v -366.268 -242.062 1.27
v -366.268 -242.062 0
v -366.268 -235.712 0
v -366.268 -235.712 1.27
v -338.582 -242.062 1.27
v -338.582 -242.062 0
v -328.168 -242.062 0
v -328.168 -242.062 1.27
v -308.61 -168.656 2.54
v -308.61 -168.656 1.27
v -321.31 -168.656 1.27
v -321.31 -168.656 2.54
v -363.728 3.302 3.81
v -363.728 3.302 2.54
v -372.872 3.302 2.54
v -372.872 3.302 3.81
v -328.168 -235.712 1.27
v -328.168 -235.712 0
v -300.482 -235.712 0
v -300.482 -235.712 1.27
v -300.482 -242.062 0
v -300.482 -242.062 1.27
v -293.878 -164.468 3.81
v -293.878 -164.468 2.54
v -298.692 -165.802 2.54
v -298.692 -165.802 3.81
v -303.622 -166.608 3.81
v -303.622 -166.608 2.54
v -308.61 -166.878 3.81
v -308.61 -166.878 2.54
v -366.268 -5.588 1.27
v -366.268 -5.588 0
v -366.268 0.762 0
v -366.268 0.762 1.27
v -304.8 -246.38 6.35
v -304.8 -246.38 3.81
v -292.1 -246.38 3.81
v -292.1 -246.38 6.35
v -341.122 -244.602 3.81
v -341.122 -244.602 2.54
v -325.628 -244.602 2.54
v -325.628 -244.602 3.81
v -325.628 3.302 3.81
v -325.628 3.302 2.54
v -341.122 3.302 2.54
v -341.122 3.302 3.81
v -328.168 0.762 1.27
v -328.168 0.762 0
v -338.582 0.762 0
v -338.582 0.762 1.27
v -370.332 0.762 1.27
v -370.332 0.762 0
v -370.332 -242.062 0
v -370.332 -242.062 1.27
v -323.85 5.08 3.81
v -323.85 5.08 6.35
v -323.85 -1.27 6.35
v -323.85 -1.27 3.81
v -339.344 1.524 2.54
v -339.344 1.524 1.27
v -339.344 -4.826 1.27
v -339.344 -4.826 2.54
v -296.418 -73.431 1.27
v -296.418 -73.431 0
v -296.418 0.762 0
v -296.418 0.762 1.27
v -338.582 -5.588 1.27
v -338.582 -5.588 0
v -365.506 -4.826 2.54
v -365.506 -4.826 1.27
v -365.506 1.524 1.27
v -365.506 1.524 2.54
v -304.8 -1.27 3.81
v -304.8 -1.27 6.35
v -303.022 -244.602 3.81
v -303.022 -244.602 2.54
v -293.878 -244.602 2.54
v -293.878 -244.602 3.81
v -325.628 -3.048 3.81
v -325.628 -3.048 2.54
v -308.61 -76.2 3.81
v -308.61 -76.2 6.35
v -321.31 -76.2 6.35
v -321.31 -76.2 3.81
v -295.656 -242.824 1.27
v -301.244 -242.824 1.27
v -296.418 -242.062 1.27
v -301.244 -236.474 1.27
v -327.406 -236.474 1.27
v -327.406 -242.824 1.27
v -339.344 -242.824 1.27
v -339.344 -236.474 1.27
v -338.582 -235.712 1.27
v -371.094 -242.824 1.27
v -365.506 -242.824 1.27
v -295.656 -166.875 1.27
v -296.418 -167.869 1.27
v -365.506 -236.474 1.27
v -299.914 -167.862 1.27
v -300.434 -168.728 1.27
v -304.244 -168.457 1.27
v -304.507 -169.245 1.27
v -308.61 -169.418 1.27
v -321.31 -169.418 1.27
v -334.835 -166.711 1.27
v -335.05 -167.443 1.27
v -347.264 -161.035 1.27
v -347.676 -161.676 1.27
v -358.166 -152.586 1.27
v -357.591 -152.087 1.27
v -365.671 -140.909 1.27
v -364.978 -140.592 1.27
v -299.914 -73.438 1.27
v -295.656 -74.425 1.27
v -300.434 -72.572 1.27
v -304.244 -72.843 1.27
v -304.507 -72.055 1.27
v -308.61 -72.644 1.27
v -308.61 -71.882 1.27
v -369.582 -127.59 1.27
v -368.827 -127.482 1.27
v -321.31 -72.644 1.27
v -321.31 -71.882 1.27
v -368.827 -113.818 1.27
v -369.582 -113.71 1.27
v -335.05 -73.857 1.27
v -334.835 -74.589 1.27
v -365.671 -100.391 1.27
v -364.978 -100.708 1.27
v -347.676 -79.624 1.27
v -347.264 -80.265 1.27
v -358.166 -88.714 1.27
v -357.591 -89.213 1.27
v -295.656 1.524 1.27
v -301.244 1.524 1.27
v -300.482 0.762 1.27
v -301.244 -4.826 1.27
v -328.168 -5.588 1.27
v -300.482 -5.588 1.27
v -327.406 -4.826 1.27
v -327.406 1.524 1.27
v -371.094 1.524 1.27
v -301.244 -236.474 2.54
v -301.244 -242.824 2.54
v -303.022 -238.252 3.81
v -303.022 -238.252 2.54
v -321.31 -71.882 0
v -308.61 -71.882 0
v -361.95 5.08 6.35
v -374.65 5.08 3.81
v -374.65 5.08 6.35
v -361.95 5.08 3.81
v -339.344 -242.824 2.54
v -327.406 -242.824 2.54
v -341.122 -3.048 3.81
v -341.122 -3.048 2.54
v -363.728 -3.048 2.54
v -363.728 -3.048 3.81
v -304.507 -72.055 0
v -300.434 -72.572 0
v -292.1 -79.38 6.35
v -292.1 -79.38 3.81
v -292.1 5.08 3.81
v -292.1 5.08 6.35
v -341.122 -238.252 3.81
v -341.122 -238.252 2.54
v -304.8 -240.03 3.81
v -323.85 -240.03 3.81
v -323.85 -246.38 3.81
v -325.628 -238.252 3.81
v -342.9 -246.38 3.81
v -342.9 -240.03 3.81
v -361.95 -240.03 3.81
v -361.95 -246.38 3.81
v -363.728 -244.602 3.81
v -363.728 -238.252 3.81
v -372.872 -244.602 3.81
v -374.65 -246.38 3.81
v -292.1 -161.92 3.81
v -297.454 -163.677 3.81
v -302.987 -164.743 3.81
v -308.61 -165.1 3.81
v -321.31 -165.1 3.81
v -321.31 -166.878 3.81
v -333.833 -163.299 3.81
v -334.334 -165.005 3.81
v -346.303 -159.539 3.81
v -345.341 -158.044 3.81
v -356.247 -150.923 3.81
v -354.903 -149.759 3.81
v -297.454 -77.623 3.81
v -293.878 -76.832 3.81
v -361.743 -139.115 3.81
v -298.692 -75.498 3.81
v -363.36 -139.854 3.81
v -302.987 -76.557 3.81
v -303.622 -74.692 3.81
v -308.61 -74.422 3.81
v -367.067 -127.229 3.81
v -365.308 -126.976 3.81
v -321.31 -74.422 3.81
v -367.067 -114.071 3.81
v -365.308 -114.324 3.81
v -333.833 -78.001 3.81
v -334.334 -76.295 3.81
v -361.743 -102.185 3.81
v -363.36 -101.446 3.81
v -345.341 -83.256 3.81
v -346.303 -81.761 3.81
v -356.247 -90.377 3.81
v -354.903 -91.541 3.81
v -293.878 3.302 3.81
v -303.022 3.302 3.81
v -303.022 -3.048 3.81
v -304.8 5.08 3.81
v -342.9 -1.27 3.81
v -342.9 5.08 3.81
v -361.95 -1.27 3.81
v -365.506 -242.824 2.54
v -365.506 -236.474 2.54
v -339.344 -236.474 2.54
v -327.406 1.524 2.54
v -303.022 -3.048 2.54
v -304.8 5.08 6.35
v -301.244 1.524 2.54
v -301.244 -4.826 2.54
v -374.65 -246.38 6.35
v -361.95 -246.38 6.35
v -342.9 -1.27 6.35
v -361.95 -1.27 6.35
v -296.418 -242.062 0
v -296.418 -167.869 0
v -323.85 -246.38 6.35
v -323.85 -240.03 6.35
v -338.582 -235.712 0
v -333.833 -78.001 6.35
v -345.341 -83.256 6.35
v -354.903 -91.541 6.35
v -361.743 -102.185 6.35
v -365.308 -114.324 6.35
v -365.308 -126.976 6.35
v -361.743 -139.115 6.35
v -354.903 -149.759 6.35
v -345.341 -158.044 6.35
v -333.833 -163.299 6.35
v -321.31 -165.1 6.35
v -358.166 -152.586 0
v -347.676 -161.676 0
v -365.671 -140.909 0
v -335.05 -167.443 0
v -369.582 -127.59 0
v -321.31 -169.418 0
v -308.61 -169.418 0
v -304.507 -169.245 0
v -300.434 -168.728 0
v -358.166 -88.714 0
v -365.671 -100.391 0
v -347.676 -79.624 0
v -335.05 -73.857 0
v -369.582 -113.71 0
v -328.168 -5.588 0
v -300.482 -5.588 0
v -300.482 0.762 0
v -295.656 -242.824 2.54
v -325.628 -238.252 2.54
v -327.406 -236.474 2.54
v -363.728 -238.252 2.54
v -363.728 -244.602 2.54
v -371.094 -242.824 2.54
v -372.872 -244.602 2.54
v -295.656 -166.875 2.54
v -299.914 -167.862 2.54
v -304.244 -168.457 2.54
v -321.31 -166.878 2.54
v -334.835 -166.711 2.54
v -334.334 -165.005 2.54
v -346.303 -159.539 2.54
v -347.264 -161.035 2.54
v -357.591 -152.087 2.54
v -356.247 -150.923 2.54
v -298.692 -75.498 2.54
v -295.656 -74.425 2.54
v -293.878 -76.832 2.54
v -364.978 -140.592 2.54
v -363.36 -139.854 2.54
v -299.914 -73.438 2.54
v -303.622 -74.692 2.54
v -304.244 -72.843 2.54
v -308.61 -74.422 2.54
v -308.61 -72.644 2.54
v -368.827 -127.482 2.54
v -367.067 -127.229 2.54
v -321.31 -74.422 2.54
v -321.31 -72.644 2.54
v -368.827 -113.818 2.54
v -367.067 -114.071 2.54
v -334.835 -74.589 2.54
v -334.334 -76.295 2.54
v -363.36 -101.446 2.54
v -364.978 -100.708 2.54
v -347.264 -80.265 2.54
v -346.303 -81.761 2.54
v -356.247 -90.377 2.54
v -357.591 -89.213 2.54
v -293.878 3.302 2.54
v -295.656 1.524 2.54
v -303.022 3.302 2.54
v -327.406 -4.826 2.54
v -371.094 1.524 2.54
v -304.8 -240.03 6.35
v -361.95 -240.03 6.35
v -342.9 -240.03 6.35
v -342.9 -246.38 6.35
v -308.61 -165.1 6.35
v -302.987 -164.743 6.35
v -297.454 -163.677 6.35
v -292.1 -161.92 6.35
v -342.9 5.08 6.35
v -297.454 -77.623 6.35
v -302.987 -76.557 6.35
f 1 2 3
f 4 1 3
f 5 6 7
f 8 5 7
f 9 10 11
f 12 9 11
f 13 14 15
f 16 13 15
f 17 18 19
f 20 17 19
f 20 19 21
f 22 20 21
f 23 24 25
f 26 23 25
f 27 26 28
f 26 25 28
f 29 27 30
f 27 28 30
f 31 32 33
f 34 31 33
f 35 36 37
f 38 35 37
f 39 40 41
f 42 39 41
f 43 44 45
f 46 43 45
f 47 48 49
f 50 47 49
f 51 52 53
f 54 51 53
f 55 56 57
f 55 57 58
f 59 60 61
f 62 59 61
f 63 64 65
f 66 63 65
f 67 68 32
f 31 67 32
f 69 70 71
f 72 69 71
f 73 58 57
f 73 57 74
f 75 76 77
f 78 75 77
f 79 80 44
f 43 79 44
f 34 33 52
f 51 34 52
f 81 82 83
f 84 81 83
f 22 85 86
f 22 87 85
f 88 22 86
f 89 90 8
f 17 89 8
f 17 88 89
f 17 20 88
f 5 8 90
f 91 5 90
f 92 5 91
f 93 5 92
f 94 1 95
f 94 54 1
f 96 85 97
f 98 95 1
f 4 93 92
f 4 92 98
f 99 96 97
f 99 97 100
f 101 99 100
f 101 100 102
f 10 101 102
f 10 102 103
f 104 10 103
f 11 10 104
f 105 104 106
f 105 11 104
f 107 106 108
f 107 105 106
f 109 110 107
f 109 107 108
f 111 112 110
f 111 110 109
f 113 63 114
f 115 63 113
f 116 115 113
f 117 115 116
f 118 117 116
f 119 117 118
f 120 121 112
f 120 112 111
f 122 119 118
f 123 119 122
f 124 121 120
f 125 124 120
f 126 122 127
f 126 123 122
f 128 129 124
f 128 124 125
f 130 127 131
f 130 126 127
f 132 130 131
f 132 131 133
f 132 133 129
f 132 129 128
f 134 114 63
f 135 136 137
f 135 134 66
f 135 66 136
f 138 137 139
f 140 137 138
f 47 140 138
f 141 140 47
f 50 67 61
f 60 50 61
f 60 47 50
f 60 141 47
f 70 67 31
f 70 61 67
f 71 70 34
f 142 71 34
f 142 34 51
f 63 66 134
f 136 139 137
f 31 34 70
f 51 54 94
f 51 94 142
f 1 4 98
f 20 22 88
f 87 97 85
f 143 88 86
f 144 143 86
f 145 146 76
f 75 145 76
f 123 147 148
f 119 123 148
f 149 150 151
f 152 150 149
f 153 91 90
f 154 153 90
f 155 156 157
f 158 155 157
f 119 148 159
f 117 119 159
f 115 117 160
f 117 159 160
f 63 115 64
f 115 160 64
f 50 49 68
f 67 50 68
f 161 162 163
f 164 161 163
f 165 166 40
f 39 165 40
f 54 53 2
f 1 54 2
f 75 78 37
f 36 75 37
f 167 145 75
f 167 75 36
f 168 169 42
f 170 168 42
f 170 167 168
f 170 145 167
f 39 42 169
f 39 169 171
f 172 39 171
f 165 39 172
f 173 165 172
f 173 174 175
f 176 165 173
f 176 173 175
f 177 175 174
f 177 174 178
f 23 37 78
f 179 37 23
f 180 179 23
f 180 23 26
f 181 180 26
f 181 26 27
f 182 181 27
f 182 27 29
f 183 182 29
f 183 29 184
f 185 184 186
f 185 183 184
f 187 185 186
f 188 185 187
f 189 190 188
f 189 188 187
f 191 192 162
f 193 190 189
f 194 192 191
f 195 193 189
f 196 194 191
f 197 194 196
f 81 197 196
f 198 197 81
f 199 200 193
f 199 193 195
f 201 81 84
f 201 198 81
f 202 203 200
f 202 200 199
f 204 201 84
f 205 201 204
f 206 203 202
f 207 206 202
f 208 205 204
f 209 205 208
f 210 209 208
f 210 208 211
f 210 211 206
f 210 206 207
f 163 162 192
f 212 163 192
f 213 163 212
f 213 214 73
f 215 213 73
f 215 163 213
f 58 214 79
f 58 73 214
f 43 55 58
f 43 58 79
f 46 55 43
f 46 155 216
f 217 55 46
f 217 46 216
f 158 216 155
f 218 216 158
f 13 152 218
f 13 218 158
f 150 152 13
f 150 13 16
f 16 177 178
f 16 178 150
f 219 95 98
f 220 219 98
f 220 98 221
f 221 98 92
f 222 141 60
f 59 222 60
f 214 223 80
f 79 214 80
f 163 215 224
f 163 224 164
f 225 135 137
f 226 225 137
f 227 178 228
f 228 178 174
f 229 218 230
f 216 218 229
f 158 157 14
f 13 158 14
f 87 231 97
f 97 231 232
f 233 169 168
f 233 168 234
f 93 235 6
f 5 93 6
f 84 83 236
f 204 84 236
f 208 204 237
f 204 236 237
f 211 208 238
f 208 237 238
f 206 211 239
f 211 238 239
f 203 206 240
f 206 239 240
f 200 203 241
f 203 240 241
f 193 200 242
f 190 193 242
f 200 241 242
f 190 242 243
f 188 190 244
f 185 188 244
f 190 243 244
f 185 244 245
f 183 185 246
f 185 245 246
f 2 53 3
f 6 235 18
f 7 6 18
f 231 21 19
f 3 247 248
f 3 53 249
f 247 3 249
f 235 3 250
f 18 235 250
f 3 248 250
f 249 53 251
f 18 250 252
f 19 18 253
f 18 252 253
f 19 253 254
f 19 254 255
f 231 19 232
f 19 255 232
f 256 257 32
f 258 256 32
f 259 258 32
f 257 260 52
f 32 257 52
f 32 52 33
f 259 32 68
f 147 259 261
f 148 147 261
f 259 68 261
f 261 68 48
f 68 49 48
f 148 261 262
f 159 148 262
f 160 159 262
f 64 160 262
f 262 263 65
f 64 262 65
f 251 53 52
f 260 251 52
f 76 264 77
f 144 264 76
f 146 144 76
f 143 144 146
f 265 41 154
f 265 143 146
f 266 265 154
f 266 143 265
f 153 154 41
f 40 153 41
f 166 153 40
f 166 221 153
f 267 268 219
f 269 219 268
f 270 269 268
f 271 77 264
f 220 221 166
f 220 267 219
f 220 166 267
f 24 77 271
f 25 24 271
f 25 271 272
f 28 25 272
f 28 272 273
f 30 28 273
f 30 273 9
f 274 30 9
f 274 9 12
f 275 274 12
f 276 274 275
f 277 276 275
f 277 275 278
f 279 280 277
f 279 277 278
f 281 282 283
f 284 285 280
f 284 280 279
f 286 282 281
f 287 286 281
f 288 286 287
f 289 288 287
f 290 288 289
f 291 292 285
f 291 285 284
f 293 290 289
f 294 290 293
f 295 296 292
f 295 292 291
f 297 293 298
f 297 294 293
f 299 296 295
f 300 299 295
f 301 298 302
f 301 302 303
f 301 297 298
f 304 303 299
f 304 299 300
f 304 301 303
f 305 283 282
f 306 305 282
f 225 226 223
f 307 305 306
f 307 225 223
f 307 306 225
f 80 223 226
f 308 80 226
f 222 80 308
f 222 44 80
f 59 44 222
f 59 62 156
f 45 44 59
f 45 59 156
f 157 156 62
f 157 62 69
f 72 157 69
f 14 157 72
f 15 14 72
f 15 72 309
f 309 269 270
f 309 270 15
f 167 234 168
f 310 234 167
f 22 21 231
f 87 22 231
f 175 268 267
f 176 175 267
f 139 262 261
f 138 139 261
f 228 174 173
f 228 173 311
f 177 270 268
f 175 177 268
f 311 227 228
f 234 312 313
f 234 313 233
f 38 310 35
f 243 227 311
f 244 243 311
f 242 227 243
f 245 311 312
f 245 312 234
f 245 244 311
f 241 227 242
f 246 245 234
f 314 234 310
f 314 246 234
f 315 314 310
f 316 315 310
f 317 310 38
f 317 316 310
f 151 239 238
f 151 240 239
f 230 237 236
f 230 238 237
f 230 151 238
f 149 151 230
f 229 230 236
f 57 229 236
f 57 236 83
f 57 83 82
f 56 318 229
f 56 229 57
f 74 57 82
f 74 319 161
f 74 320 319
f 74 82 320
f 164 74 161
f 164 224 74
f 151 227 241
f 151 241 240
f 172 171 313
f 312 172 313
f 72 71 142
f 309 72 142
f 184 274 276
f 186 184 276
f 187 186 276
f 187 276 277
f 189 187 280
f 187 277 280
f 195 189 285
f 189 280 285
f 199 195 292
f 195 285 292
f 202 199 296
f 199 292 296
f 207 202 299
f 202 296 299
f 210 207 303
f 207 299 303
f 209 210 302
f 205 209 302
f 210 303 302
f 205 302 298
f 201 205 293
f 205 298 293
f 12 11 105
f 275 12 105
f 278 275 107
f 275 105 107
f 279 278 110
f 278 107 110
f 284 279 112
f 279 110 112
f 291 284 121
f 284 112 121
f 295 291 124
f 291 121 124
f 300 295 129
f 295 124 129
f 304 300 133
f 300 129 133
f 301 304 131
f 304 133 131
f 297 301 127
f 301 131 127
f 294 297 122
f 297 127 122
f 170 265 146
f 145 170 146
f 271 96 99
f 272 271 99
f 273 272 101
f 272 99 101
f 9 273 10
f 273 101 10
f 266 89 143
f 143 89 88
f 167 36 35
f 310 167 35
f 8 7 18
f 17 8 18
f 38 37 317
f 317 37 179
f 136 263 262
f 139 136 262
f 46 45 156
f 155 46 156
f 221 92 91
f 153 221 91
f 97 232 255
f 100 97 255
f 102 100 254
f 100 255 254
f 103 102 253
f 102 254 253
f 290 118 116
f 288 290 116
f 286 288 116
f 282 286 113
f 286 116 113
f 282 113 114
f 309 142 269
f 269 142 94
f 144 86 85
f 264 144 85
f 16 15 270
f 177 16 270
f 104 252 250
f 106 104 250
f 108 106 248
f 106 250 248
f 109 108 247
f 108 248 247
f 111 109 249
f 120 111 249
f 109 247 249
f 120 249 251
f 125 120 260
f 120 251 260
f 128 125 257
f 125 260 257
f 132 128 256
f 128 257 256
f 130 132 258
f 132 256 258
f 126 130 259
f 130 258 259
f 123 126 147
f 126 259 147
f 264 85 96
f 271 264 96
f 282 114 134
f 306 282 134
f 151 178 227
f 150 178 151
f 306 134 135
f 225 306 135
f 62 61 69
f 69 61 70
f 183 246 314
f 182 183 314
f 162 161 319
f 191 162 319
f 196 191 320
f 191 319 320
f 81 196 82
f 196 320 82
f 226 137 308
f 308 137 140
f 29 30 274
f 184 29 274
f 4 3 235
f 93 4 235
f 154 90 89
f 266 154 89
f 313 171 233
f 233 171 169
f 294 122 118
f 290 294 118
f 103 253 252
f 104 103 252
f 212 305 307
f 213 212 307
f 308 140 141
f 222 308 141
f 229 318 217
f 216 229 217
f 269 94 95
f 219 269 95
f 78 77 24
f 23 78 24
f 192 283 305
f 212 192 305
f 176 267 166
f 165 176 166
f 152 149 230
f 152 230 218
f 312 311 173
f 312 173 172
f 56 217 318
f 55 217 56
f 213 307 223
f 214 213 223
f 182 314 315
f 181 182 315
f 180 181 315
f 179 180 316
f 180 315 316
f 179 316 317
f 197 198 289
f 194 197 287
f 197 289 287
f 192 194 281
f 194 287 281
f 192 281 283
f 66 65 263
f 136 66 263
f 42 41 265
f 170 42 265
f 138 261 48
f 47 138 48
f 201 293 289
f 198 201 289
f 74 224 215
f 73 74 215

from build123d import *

# Parameters (mm, degrees)
SKETCH1_W           = 82.55
SKETCH1_H           = 251.46
BOSS_EXTRUDE1_DEPTH = 6.35
SKETCH2_W           = 19.05
SKETCH2_H           = 6.35
CUT_EXTRUDE2_DEPTH  = 6.35
SKETCH5_W           = 19.05
SKETCH5_H           = 6.35
CUT_EXTRUDE4_DEPTH  = 6.35
CUT_EXTRUDE5_DEPTH  = 7.35
CUT_EXTRUDE6_DEPTH  = 3.81
CUT_EXTRUDE7_DEPTH  = 2.54
CUT_EXTRUDE8_DEPTH  = 1.27


with BuildPart() as part:
    # Sketch1 → Boss-Extrude1 (new body)
    with BuildSketch(Plane.XY):
        with Locations((-333.375, -120.65)):
            Rectangle(SKETCH1_W, SKETCH1_H)
    extrude(amount=BOSS_EXTRUDE1_DEPTH)

    # Sketch2 → Cut-Extrude2 (cut)
    with BuildSketch(Plane(origin=(0, 5.08, 0), x_dir=(1, 0, 0), z_dir=(0, 1, 0))):
        with Locations((-352.425, -3.175)):
            Rectangle(SKETCH2_W, SKETCH2_H)
        with Locations((-314.325, -3.175)):
            Rectangle(SKETCH2_W, SKETCH2_H)
    extrude(amount=-CUT_EXTRUDE2_DEPTH, mode=Mode.SUBTRACT)

    # Sketch5 → Cut-Extrude4 (cut)
    with BuildSketch(Plane.XZ.offset(246.38)):
        with Locations((-352.425, 3.175)):
            Rectangle(SKETCH5_W, SKETCH5_H)
        with Locations((-314.325, 3.175)):
            Rectangle(SKETCH5_W, SKETCH5_H)
    extrude(amount=-CUT_EXTRUDE4_DEPTH, mode=Mode.SUBTRACT)

    # Sketch6 → Cut-Extrude5 (cut, through all)
    with BuildSketch(Plane.XY.offset(6.35)):
        with BuildLine():
            Line((-321.31, -165.1), (-308.61, -165.1))
            ThreePointArc((-308.61, -165.1), (-264.16, -120.65), (-308.61, -76.2))
            Line((-308.61, -76.2), (-321.31, -76.2))
            ThreePointArc((-321.31, -76.2), (-365.76, -120.65), (-321.31, -165.1))
        make_face()
    extrude(amount=-CUT_EXTRUDE5_DEPTH, mode=Mode.SUBTRACT)

    # Sketch8 → Cut-Extrude6 (cut)
    with BuildSketch(Plane(origin=(0, 0, 0), x_dir=(-1, 0, 0), z_dir=(0, 0, -1))):
        with BuildLine():
            Line((374.65, 5.08), (361.95, 5.08))
            Line((361.95, 5.08), (361.95, -1.27))
            Line((361.95, -1.27), (342.9, -1.27))
            Line((342.9, -1.27), (342.9, 5.08))
            Line((342.9, 5.08), (323.85, 5.08))
            Line((323.85, 5.08), (323.85, -1.27))
            Line((323.85, -1.27), (304.8, -1.27))
            Line((304.8, -1.27), (304.8, 5.08))
            Line((304.8, 5.08), (292.1, 5.08))
            Line((292.1, 5.08), (292.1, -79.379884904))
            ThreePointArc((292.1, -79.379884904), (300.20327995, -77.002210159), (308.61, -76.2))
            Line((308.61, -76.2), (321.31, -76.2))
            ThreePointArc((321.31, -76.2), (365.76, -120.65), (321.31, -165.1))
            Line((321.31, -165.1), (308.61, -165.1))
            ThreePointArc((308.61, -165.1), (300.20327995, -164.297789841), (292.1, -161.920115096))
            Line((292.1, -161.920115096), (292.1, -246.38))
            Line((292.1, -246.38), (304.8, -246.38))
            Line((304.8, -246.38), (304.8, -240.03))
            Line((304.8, -240.03), (323.85, -240.03))
            Line((323.85, -240.03), (323.85, -246.38))
            Line((323.85, -246.38), (342.9, -246.38))
            Line((342.9, -246.38), (342.9, -240.03))
            Line((342.9, -240.03), (361.95, -240.03))
            Line((361.95, -240.03), (361.95, -246.38))
            Line((361.95, -246.38), (374.65, -246.38))
            Line((374.65, -246.38), (374.65, 5.08))
        make_face()
        with BuildLine():
            Line((321.31, -74.422), (308.61, -74.422))
            ThreePointArc((308.61, -74.422), (301.146068779, -75.02853888), (293.878, -76.832239217))
            Line((293.878, -76.832239217), (293.878, 3.302))
            Line((293.878, 3.302), (303.022, 3.302))
            Line((303.022, 3.302), (303.022, -3.048))
            Line((303.022, -3.048), (325.628, -3.048))
            Line((325.628, -3.048), (325.628, 3.302))
            Line((325.628, 3.302), (341.122, 3.302))
            Line((341.122, 3.302), (341.122, -3.048))
            Line((341.122, -3.048), (363.728, -3.048))
            Line((363.728, -3.048), (363.728, 3.302))
            Line((363.728, 3.302), (372.872, 3.302))
            Line((372.872, 3.302), (372.872, -244.602))
            Line((372.872, -244.602), (363.728, -244.602))
            Line((363.728, -244.602), (363.728, -238.252))
            Line((363.728, -238.252), (341.122, -238.252))
            Line((341.122, -238.252), (341.122, -244.602))
            Line((341.122, -244.602), (325.628, -244.602))
            Line((325.628, -244.602), (325.628, -238.252))
            Line((325.628, -238.252), (303.022, -238.252))
            Line((303.022, -238.252), (303.022, -244.602))
            Line((303.022, -244.602), (293.878, -244.602))
            Line((293.878, -244.602), (293.878, -164.467760783))
            ThreePointArc((293.878, -164.467760783), (301.146068779, -166.27146112), (308.61, -166.878))
            Line((308.61, -166.878), (321.31, -166.878))
            ThreePointArc((321.31, -166.878), (367.538, -120.65), (321.31, -74.422))
        make_face(mode=Mode.SUBTRACT)
    extrude(amount=-CUT_EXTRUDE6_DEPTH, mode=Mode.SUBTRACT)

    # Sketch9 → Cut-Extrude7 (cut)
    with BuildSketch(Plane(origin=(0, 0, 0), x_dir=(-1, 0, 0), z_dir=(0, 0, -1))):
        with BuildLine():
            Line((308.61, -74.422), (321.31, -74.422))
            ThreePointArc((321.31, -74.422), (367.538, -120.65), (321.31, -166.878))
            Line((321.31, -166.878), (308.61, -166.878))
            ThreePointArc((308.61, -166.878), (301.146068779, -166.27146112), (293.878, -164.467760783))
            Line((293.878, -164.467760783), (293.878, -244.602))
            Line((293.878, -244.602), (303.022, -244.602))
            Line((303.022, -244.602), (303.022, -238.252))
            Line((303.022, -238.252), (325.628, -238.252))
            Line((325.628, -238.252), (325.628, -244.602))
            Line((325.628, -244.602), (341.122, -244.602))
            Line((341.122, -244.602), (341.122, -238.252))
            Line((341.122, -238.252), (363.728, -238.252))
            Line((363.728, -238.252), (363.728, -244.602))
            Line((363.728, -244.602), (372.872, -244.602))
            Line((372.872, -244.602), (372.872, 3.302))
            Line((372.872, 3.302), (363.728, 3.302))
            Line((363.728, 3.302), (363.728, -3.048))
            Line((363.728, -3.048), (341.122, -3.048))
            Line((341.122, -3.048), (341.122, 3.302))
            Line((341.122, 3.302), (325.628, 3.302))
            Line((325.628, 3.302), (325.628, -3.048))
            Line((325.628, -3.048), (303.022, -3.048))
            Line((303.022, -3.048), (303.022, 3.302))
            Line((303.022, 3.302), (293.878, 3.302))
            Line((293.878, 3.302), (293.878, -76.832239217))
            ThreePointArc((293.878, -76.832239217), (301.146068779, -75.02853888), (308.61, -74.422))
        make_face()
        with BuildLine():
            Line((295.656, -242.824), (295.656, -166.875208707))
            ThreePointArc((295.656, -166.875208707), (302.072084934, -168.208718471), (308.61, -168.656))
            Line((308.61, -168.656), (321.31, -168.656))
            ThreePointArc((321.31, -168.656), (369.316, -120.65), (321.31, -72.644))
            Line((321.31, -72.644), (308.61, -72.644))
            ThreePointArc((308.61, -72.644), (302.072084934, -73.091281529), (295.656, -74.424791293))
            Line((295.656, -74.424791293), (295.656, 1.524))
            Line((295.656, 1.524), (301.244, 1.524))
            Line((301.244, 1.524), (301.244, -4.826))
            Line((301.244, -4.826), (327.406, -4.826))
            Line((327.406, -4.826), (327.406, 1.524))
            Line((327.406, 1.524), (339.344, 1.524))
            Line((339.344, 1.524), (339.344, -4.826))
            Line((339.344, -4.826), (365.506, -4.826))
            Line((365.506, -4.826), (365.506, 1.524))
            Line((365.506, 1.524), (371.094, 1.524))
            Line((371.094, 1.524), (371.094, -242.824))
            Line((371.094, -242.824), (365.506, -242.824))
            Line((365.506, -242.824), (365.506, -236.474))
            Line((365.506, -236.474), (339.344, -236.474))
            Line((339.344, -236.474), (339.344, -242.824))
            Line((339.344, -242.824), (327.406, -242.824))
            Line((327.406, -242.824), (327.406, -236.474))
            Line((327.406, -236.474), (301.244, -236.474))
            Line((301.244, -236.474), (301.244, -242.824))
            Line((301.244, -242.824), (295.656, -242.824))
        make_face(mode=Mode.SUBTRACT)
    extrude(amount=-CUT_EXTRUDE7_DEPTH, mode=Mode.SUBTRACT)

    # Sketch10 → Cut-Extrude8 (cut)
    with BuildSketch(Plane(origin=(0, 0, 0), x_dir=(-1, 0, 0), z_dir=(0, 0, -1))):
        with BuildLine():
            Line((295.656, -166.875208707), (295.656, -242.824))
            Line((295.656, -242.824), (301.244, -242.824))
            Line((301.244, -242.824), (301.244, -236.474))
            Line((301.244, -236.474), (327.406, -236.474))
            Line((327.406, -236.474), (327.406, -242.824))
            Line((327.406, -242.824), (339.344, -242.824))
            Line((339.344, -242.824), (339.344, -236.474))
            Line((339.344, -236.474), (365.506, -236.474))
            Line((365.506, -236.474), (365.506, -242.824))
            Line((365.506, -242.824), (371.094, -242.824))
            Line((371.094, -242.824), (371.094, 1.524))
            Line((371.094, 1.524), (365.506, 1.524))
            Line((365.506, 1.524), (365.506, -4.826))
            Line((365.506, -4.826), (339.344, -4.826))
            Line((339.344, -4.826), (339.344, 1.524))
            Line((339.344, 1.524), (327.406, 1.524))
            Line((327.406, 1.524), (327.406, -4.826))
            Line((327.406, -4.826), (301.244, -4.826))
            Line((301.244, -4.826), (301.244, 1.524))
            Line((301.244, 1.524), (295.656, 1.524))
            Line((295.656, 1.524), (295.656, -74.424791293))
            ThreePointArc((295.656, -74.424791293), (302.072084934, -73.091281529), (308.61, -72.644))
            Line((308.61, -72.644), (321.31, -72.644))
            ThreePointArc((321.31, -72.644), (369.316, -120.65), (321.31, -168.656))
            Line((321.31, -168.656), (308.61, -168.656))
            ThreePointArc((308.61, -168.656), (302.072084934, -168.208718471), (295.656, -166.875208707))
        make_face()
        with BuildLine():
            Line((308.61, -169.418), (321.31, -169.418))
            ThreePointArc((321.31, -169.418), (370.078, -120.65), (321.31, -71.882))
            Line((321.31, -71.882), (308.61, -71.882))
            ThreePointArc((308.61, -71.882), (302.465022664, -72.270695772), (296.418, -73.430587043))
            Line((296.418, -73.430587043), (296.418, 0.762))
            Line((296.418, 0.762), (300.482, 0.762))
            Line((300.482, 0.762), (300.482, -5.588))
            Line((300.482, -5.588), (328.168, -5.588))
            Line((328.168, -5.588), (328.168, 0.762))
            Line((328.168, 0.762), (338.582, 0.762))
            Line((338.582, 0.762), (338.582, -5.588))
            Line((338.582, -5.588), (366.268, -5.588))
            Line((366.268, -5.588), (366.268, 0.762))
            Line((366.268, 0.762), (370.332, 0.762))
            Line((370.332, 0.762), (370.332, -242.062))
            Line((370.332, -242.062), (366.268, -242.062))
            Line((366.268, -242.062), (366.268, -235.712))
            Line((366.268, -235.712), (338.582, -235.712))
            Line((338.582, -235.712), (338.582, -242.062))
            Line((338.582, -242.062), (328.168, -242.062))
            Line((328.168, -242.062), (328.168, -235.712))
            Line((328.168, -235.712), (300.482, -235.712))
            Line((300.482, -235.712), (300.482, -242.062))
            Line((300.482, -242.062), (296.418, -242.062))
            Line((296.418, -242.062), (296.418, -167.869412957))
            ThreePointArc((296.418, -167.869412957), (302.465022664, -169.029304228), (308.61, -169.418))
        make_face(mode=Mode.SUBTRACT)
    extrude(amount=-CUT_EXTRUDE8_DEPTH, mode=Mode.SUBTRACT)


solid = part.part
